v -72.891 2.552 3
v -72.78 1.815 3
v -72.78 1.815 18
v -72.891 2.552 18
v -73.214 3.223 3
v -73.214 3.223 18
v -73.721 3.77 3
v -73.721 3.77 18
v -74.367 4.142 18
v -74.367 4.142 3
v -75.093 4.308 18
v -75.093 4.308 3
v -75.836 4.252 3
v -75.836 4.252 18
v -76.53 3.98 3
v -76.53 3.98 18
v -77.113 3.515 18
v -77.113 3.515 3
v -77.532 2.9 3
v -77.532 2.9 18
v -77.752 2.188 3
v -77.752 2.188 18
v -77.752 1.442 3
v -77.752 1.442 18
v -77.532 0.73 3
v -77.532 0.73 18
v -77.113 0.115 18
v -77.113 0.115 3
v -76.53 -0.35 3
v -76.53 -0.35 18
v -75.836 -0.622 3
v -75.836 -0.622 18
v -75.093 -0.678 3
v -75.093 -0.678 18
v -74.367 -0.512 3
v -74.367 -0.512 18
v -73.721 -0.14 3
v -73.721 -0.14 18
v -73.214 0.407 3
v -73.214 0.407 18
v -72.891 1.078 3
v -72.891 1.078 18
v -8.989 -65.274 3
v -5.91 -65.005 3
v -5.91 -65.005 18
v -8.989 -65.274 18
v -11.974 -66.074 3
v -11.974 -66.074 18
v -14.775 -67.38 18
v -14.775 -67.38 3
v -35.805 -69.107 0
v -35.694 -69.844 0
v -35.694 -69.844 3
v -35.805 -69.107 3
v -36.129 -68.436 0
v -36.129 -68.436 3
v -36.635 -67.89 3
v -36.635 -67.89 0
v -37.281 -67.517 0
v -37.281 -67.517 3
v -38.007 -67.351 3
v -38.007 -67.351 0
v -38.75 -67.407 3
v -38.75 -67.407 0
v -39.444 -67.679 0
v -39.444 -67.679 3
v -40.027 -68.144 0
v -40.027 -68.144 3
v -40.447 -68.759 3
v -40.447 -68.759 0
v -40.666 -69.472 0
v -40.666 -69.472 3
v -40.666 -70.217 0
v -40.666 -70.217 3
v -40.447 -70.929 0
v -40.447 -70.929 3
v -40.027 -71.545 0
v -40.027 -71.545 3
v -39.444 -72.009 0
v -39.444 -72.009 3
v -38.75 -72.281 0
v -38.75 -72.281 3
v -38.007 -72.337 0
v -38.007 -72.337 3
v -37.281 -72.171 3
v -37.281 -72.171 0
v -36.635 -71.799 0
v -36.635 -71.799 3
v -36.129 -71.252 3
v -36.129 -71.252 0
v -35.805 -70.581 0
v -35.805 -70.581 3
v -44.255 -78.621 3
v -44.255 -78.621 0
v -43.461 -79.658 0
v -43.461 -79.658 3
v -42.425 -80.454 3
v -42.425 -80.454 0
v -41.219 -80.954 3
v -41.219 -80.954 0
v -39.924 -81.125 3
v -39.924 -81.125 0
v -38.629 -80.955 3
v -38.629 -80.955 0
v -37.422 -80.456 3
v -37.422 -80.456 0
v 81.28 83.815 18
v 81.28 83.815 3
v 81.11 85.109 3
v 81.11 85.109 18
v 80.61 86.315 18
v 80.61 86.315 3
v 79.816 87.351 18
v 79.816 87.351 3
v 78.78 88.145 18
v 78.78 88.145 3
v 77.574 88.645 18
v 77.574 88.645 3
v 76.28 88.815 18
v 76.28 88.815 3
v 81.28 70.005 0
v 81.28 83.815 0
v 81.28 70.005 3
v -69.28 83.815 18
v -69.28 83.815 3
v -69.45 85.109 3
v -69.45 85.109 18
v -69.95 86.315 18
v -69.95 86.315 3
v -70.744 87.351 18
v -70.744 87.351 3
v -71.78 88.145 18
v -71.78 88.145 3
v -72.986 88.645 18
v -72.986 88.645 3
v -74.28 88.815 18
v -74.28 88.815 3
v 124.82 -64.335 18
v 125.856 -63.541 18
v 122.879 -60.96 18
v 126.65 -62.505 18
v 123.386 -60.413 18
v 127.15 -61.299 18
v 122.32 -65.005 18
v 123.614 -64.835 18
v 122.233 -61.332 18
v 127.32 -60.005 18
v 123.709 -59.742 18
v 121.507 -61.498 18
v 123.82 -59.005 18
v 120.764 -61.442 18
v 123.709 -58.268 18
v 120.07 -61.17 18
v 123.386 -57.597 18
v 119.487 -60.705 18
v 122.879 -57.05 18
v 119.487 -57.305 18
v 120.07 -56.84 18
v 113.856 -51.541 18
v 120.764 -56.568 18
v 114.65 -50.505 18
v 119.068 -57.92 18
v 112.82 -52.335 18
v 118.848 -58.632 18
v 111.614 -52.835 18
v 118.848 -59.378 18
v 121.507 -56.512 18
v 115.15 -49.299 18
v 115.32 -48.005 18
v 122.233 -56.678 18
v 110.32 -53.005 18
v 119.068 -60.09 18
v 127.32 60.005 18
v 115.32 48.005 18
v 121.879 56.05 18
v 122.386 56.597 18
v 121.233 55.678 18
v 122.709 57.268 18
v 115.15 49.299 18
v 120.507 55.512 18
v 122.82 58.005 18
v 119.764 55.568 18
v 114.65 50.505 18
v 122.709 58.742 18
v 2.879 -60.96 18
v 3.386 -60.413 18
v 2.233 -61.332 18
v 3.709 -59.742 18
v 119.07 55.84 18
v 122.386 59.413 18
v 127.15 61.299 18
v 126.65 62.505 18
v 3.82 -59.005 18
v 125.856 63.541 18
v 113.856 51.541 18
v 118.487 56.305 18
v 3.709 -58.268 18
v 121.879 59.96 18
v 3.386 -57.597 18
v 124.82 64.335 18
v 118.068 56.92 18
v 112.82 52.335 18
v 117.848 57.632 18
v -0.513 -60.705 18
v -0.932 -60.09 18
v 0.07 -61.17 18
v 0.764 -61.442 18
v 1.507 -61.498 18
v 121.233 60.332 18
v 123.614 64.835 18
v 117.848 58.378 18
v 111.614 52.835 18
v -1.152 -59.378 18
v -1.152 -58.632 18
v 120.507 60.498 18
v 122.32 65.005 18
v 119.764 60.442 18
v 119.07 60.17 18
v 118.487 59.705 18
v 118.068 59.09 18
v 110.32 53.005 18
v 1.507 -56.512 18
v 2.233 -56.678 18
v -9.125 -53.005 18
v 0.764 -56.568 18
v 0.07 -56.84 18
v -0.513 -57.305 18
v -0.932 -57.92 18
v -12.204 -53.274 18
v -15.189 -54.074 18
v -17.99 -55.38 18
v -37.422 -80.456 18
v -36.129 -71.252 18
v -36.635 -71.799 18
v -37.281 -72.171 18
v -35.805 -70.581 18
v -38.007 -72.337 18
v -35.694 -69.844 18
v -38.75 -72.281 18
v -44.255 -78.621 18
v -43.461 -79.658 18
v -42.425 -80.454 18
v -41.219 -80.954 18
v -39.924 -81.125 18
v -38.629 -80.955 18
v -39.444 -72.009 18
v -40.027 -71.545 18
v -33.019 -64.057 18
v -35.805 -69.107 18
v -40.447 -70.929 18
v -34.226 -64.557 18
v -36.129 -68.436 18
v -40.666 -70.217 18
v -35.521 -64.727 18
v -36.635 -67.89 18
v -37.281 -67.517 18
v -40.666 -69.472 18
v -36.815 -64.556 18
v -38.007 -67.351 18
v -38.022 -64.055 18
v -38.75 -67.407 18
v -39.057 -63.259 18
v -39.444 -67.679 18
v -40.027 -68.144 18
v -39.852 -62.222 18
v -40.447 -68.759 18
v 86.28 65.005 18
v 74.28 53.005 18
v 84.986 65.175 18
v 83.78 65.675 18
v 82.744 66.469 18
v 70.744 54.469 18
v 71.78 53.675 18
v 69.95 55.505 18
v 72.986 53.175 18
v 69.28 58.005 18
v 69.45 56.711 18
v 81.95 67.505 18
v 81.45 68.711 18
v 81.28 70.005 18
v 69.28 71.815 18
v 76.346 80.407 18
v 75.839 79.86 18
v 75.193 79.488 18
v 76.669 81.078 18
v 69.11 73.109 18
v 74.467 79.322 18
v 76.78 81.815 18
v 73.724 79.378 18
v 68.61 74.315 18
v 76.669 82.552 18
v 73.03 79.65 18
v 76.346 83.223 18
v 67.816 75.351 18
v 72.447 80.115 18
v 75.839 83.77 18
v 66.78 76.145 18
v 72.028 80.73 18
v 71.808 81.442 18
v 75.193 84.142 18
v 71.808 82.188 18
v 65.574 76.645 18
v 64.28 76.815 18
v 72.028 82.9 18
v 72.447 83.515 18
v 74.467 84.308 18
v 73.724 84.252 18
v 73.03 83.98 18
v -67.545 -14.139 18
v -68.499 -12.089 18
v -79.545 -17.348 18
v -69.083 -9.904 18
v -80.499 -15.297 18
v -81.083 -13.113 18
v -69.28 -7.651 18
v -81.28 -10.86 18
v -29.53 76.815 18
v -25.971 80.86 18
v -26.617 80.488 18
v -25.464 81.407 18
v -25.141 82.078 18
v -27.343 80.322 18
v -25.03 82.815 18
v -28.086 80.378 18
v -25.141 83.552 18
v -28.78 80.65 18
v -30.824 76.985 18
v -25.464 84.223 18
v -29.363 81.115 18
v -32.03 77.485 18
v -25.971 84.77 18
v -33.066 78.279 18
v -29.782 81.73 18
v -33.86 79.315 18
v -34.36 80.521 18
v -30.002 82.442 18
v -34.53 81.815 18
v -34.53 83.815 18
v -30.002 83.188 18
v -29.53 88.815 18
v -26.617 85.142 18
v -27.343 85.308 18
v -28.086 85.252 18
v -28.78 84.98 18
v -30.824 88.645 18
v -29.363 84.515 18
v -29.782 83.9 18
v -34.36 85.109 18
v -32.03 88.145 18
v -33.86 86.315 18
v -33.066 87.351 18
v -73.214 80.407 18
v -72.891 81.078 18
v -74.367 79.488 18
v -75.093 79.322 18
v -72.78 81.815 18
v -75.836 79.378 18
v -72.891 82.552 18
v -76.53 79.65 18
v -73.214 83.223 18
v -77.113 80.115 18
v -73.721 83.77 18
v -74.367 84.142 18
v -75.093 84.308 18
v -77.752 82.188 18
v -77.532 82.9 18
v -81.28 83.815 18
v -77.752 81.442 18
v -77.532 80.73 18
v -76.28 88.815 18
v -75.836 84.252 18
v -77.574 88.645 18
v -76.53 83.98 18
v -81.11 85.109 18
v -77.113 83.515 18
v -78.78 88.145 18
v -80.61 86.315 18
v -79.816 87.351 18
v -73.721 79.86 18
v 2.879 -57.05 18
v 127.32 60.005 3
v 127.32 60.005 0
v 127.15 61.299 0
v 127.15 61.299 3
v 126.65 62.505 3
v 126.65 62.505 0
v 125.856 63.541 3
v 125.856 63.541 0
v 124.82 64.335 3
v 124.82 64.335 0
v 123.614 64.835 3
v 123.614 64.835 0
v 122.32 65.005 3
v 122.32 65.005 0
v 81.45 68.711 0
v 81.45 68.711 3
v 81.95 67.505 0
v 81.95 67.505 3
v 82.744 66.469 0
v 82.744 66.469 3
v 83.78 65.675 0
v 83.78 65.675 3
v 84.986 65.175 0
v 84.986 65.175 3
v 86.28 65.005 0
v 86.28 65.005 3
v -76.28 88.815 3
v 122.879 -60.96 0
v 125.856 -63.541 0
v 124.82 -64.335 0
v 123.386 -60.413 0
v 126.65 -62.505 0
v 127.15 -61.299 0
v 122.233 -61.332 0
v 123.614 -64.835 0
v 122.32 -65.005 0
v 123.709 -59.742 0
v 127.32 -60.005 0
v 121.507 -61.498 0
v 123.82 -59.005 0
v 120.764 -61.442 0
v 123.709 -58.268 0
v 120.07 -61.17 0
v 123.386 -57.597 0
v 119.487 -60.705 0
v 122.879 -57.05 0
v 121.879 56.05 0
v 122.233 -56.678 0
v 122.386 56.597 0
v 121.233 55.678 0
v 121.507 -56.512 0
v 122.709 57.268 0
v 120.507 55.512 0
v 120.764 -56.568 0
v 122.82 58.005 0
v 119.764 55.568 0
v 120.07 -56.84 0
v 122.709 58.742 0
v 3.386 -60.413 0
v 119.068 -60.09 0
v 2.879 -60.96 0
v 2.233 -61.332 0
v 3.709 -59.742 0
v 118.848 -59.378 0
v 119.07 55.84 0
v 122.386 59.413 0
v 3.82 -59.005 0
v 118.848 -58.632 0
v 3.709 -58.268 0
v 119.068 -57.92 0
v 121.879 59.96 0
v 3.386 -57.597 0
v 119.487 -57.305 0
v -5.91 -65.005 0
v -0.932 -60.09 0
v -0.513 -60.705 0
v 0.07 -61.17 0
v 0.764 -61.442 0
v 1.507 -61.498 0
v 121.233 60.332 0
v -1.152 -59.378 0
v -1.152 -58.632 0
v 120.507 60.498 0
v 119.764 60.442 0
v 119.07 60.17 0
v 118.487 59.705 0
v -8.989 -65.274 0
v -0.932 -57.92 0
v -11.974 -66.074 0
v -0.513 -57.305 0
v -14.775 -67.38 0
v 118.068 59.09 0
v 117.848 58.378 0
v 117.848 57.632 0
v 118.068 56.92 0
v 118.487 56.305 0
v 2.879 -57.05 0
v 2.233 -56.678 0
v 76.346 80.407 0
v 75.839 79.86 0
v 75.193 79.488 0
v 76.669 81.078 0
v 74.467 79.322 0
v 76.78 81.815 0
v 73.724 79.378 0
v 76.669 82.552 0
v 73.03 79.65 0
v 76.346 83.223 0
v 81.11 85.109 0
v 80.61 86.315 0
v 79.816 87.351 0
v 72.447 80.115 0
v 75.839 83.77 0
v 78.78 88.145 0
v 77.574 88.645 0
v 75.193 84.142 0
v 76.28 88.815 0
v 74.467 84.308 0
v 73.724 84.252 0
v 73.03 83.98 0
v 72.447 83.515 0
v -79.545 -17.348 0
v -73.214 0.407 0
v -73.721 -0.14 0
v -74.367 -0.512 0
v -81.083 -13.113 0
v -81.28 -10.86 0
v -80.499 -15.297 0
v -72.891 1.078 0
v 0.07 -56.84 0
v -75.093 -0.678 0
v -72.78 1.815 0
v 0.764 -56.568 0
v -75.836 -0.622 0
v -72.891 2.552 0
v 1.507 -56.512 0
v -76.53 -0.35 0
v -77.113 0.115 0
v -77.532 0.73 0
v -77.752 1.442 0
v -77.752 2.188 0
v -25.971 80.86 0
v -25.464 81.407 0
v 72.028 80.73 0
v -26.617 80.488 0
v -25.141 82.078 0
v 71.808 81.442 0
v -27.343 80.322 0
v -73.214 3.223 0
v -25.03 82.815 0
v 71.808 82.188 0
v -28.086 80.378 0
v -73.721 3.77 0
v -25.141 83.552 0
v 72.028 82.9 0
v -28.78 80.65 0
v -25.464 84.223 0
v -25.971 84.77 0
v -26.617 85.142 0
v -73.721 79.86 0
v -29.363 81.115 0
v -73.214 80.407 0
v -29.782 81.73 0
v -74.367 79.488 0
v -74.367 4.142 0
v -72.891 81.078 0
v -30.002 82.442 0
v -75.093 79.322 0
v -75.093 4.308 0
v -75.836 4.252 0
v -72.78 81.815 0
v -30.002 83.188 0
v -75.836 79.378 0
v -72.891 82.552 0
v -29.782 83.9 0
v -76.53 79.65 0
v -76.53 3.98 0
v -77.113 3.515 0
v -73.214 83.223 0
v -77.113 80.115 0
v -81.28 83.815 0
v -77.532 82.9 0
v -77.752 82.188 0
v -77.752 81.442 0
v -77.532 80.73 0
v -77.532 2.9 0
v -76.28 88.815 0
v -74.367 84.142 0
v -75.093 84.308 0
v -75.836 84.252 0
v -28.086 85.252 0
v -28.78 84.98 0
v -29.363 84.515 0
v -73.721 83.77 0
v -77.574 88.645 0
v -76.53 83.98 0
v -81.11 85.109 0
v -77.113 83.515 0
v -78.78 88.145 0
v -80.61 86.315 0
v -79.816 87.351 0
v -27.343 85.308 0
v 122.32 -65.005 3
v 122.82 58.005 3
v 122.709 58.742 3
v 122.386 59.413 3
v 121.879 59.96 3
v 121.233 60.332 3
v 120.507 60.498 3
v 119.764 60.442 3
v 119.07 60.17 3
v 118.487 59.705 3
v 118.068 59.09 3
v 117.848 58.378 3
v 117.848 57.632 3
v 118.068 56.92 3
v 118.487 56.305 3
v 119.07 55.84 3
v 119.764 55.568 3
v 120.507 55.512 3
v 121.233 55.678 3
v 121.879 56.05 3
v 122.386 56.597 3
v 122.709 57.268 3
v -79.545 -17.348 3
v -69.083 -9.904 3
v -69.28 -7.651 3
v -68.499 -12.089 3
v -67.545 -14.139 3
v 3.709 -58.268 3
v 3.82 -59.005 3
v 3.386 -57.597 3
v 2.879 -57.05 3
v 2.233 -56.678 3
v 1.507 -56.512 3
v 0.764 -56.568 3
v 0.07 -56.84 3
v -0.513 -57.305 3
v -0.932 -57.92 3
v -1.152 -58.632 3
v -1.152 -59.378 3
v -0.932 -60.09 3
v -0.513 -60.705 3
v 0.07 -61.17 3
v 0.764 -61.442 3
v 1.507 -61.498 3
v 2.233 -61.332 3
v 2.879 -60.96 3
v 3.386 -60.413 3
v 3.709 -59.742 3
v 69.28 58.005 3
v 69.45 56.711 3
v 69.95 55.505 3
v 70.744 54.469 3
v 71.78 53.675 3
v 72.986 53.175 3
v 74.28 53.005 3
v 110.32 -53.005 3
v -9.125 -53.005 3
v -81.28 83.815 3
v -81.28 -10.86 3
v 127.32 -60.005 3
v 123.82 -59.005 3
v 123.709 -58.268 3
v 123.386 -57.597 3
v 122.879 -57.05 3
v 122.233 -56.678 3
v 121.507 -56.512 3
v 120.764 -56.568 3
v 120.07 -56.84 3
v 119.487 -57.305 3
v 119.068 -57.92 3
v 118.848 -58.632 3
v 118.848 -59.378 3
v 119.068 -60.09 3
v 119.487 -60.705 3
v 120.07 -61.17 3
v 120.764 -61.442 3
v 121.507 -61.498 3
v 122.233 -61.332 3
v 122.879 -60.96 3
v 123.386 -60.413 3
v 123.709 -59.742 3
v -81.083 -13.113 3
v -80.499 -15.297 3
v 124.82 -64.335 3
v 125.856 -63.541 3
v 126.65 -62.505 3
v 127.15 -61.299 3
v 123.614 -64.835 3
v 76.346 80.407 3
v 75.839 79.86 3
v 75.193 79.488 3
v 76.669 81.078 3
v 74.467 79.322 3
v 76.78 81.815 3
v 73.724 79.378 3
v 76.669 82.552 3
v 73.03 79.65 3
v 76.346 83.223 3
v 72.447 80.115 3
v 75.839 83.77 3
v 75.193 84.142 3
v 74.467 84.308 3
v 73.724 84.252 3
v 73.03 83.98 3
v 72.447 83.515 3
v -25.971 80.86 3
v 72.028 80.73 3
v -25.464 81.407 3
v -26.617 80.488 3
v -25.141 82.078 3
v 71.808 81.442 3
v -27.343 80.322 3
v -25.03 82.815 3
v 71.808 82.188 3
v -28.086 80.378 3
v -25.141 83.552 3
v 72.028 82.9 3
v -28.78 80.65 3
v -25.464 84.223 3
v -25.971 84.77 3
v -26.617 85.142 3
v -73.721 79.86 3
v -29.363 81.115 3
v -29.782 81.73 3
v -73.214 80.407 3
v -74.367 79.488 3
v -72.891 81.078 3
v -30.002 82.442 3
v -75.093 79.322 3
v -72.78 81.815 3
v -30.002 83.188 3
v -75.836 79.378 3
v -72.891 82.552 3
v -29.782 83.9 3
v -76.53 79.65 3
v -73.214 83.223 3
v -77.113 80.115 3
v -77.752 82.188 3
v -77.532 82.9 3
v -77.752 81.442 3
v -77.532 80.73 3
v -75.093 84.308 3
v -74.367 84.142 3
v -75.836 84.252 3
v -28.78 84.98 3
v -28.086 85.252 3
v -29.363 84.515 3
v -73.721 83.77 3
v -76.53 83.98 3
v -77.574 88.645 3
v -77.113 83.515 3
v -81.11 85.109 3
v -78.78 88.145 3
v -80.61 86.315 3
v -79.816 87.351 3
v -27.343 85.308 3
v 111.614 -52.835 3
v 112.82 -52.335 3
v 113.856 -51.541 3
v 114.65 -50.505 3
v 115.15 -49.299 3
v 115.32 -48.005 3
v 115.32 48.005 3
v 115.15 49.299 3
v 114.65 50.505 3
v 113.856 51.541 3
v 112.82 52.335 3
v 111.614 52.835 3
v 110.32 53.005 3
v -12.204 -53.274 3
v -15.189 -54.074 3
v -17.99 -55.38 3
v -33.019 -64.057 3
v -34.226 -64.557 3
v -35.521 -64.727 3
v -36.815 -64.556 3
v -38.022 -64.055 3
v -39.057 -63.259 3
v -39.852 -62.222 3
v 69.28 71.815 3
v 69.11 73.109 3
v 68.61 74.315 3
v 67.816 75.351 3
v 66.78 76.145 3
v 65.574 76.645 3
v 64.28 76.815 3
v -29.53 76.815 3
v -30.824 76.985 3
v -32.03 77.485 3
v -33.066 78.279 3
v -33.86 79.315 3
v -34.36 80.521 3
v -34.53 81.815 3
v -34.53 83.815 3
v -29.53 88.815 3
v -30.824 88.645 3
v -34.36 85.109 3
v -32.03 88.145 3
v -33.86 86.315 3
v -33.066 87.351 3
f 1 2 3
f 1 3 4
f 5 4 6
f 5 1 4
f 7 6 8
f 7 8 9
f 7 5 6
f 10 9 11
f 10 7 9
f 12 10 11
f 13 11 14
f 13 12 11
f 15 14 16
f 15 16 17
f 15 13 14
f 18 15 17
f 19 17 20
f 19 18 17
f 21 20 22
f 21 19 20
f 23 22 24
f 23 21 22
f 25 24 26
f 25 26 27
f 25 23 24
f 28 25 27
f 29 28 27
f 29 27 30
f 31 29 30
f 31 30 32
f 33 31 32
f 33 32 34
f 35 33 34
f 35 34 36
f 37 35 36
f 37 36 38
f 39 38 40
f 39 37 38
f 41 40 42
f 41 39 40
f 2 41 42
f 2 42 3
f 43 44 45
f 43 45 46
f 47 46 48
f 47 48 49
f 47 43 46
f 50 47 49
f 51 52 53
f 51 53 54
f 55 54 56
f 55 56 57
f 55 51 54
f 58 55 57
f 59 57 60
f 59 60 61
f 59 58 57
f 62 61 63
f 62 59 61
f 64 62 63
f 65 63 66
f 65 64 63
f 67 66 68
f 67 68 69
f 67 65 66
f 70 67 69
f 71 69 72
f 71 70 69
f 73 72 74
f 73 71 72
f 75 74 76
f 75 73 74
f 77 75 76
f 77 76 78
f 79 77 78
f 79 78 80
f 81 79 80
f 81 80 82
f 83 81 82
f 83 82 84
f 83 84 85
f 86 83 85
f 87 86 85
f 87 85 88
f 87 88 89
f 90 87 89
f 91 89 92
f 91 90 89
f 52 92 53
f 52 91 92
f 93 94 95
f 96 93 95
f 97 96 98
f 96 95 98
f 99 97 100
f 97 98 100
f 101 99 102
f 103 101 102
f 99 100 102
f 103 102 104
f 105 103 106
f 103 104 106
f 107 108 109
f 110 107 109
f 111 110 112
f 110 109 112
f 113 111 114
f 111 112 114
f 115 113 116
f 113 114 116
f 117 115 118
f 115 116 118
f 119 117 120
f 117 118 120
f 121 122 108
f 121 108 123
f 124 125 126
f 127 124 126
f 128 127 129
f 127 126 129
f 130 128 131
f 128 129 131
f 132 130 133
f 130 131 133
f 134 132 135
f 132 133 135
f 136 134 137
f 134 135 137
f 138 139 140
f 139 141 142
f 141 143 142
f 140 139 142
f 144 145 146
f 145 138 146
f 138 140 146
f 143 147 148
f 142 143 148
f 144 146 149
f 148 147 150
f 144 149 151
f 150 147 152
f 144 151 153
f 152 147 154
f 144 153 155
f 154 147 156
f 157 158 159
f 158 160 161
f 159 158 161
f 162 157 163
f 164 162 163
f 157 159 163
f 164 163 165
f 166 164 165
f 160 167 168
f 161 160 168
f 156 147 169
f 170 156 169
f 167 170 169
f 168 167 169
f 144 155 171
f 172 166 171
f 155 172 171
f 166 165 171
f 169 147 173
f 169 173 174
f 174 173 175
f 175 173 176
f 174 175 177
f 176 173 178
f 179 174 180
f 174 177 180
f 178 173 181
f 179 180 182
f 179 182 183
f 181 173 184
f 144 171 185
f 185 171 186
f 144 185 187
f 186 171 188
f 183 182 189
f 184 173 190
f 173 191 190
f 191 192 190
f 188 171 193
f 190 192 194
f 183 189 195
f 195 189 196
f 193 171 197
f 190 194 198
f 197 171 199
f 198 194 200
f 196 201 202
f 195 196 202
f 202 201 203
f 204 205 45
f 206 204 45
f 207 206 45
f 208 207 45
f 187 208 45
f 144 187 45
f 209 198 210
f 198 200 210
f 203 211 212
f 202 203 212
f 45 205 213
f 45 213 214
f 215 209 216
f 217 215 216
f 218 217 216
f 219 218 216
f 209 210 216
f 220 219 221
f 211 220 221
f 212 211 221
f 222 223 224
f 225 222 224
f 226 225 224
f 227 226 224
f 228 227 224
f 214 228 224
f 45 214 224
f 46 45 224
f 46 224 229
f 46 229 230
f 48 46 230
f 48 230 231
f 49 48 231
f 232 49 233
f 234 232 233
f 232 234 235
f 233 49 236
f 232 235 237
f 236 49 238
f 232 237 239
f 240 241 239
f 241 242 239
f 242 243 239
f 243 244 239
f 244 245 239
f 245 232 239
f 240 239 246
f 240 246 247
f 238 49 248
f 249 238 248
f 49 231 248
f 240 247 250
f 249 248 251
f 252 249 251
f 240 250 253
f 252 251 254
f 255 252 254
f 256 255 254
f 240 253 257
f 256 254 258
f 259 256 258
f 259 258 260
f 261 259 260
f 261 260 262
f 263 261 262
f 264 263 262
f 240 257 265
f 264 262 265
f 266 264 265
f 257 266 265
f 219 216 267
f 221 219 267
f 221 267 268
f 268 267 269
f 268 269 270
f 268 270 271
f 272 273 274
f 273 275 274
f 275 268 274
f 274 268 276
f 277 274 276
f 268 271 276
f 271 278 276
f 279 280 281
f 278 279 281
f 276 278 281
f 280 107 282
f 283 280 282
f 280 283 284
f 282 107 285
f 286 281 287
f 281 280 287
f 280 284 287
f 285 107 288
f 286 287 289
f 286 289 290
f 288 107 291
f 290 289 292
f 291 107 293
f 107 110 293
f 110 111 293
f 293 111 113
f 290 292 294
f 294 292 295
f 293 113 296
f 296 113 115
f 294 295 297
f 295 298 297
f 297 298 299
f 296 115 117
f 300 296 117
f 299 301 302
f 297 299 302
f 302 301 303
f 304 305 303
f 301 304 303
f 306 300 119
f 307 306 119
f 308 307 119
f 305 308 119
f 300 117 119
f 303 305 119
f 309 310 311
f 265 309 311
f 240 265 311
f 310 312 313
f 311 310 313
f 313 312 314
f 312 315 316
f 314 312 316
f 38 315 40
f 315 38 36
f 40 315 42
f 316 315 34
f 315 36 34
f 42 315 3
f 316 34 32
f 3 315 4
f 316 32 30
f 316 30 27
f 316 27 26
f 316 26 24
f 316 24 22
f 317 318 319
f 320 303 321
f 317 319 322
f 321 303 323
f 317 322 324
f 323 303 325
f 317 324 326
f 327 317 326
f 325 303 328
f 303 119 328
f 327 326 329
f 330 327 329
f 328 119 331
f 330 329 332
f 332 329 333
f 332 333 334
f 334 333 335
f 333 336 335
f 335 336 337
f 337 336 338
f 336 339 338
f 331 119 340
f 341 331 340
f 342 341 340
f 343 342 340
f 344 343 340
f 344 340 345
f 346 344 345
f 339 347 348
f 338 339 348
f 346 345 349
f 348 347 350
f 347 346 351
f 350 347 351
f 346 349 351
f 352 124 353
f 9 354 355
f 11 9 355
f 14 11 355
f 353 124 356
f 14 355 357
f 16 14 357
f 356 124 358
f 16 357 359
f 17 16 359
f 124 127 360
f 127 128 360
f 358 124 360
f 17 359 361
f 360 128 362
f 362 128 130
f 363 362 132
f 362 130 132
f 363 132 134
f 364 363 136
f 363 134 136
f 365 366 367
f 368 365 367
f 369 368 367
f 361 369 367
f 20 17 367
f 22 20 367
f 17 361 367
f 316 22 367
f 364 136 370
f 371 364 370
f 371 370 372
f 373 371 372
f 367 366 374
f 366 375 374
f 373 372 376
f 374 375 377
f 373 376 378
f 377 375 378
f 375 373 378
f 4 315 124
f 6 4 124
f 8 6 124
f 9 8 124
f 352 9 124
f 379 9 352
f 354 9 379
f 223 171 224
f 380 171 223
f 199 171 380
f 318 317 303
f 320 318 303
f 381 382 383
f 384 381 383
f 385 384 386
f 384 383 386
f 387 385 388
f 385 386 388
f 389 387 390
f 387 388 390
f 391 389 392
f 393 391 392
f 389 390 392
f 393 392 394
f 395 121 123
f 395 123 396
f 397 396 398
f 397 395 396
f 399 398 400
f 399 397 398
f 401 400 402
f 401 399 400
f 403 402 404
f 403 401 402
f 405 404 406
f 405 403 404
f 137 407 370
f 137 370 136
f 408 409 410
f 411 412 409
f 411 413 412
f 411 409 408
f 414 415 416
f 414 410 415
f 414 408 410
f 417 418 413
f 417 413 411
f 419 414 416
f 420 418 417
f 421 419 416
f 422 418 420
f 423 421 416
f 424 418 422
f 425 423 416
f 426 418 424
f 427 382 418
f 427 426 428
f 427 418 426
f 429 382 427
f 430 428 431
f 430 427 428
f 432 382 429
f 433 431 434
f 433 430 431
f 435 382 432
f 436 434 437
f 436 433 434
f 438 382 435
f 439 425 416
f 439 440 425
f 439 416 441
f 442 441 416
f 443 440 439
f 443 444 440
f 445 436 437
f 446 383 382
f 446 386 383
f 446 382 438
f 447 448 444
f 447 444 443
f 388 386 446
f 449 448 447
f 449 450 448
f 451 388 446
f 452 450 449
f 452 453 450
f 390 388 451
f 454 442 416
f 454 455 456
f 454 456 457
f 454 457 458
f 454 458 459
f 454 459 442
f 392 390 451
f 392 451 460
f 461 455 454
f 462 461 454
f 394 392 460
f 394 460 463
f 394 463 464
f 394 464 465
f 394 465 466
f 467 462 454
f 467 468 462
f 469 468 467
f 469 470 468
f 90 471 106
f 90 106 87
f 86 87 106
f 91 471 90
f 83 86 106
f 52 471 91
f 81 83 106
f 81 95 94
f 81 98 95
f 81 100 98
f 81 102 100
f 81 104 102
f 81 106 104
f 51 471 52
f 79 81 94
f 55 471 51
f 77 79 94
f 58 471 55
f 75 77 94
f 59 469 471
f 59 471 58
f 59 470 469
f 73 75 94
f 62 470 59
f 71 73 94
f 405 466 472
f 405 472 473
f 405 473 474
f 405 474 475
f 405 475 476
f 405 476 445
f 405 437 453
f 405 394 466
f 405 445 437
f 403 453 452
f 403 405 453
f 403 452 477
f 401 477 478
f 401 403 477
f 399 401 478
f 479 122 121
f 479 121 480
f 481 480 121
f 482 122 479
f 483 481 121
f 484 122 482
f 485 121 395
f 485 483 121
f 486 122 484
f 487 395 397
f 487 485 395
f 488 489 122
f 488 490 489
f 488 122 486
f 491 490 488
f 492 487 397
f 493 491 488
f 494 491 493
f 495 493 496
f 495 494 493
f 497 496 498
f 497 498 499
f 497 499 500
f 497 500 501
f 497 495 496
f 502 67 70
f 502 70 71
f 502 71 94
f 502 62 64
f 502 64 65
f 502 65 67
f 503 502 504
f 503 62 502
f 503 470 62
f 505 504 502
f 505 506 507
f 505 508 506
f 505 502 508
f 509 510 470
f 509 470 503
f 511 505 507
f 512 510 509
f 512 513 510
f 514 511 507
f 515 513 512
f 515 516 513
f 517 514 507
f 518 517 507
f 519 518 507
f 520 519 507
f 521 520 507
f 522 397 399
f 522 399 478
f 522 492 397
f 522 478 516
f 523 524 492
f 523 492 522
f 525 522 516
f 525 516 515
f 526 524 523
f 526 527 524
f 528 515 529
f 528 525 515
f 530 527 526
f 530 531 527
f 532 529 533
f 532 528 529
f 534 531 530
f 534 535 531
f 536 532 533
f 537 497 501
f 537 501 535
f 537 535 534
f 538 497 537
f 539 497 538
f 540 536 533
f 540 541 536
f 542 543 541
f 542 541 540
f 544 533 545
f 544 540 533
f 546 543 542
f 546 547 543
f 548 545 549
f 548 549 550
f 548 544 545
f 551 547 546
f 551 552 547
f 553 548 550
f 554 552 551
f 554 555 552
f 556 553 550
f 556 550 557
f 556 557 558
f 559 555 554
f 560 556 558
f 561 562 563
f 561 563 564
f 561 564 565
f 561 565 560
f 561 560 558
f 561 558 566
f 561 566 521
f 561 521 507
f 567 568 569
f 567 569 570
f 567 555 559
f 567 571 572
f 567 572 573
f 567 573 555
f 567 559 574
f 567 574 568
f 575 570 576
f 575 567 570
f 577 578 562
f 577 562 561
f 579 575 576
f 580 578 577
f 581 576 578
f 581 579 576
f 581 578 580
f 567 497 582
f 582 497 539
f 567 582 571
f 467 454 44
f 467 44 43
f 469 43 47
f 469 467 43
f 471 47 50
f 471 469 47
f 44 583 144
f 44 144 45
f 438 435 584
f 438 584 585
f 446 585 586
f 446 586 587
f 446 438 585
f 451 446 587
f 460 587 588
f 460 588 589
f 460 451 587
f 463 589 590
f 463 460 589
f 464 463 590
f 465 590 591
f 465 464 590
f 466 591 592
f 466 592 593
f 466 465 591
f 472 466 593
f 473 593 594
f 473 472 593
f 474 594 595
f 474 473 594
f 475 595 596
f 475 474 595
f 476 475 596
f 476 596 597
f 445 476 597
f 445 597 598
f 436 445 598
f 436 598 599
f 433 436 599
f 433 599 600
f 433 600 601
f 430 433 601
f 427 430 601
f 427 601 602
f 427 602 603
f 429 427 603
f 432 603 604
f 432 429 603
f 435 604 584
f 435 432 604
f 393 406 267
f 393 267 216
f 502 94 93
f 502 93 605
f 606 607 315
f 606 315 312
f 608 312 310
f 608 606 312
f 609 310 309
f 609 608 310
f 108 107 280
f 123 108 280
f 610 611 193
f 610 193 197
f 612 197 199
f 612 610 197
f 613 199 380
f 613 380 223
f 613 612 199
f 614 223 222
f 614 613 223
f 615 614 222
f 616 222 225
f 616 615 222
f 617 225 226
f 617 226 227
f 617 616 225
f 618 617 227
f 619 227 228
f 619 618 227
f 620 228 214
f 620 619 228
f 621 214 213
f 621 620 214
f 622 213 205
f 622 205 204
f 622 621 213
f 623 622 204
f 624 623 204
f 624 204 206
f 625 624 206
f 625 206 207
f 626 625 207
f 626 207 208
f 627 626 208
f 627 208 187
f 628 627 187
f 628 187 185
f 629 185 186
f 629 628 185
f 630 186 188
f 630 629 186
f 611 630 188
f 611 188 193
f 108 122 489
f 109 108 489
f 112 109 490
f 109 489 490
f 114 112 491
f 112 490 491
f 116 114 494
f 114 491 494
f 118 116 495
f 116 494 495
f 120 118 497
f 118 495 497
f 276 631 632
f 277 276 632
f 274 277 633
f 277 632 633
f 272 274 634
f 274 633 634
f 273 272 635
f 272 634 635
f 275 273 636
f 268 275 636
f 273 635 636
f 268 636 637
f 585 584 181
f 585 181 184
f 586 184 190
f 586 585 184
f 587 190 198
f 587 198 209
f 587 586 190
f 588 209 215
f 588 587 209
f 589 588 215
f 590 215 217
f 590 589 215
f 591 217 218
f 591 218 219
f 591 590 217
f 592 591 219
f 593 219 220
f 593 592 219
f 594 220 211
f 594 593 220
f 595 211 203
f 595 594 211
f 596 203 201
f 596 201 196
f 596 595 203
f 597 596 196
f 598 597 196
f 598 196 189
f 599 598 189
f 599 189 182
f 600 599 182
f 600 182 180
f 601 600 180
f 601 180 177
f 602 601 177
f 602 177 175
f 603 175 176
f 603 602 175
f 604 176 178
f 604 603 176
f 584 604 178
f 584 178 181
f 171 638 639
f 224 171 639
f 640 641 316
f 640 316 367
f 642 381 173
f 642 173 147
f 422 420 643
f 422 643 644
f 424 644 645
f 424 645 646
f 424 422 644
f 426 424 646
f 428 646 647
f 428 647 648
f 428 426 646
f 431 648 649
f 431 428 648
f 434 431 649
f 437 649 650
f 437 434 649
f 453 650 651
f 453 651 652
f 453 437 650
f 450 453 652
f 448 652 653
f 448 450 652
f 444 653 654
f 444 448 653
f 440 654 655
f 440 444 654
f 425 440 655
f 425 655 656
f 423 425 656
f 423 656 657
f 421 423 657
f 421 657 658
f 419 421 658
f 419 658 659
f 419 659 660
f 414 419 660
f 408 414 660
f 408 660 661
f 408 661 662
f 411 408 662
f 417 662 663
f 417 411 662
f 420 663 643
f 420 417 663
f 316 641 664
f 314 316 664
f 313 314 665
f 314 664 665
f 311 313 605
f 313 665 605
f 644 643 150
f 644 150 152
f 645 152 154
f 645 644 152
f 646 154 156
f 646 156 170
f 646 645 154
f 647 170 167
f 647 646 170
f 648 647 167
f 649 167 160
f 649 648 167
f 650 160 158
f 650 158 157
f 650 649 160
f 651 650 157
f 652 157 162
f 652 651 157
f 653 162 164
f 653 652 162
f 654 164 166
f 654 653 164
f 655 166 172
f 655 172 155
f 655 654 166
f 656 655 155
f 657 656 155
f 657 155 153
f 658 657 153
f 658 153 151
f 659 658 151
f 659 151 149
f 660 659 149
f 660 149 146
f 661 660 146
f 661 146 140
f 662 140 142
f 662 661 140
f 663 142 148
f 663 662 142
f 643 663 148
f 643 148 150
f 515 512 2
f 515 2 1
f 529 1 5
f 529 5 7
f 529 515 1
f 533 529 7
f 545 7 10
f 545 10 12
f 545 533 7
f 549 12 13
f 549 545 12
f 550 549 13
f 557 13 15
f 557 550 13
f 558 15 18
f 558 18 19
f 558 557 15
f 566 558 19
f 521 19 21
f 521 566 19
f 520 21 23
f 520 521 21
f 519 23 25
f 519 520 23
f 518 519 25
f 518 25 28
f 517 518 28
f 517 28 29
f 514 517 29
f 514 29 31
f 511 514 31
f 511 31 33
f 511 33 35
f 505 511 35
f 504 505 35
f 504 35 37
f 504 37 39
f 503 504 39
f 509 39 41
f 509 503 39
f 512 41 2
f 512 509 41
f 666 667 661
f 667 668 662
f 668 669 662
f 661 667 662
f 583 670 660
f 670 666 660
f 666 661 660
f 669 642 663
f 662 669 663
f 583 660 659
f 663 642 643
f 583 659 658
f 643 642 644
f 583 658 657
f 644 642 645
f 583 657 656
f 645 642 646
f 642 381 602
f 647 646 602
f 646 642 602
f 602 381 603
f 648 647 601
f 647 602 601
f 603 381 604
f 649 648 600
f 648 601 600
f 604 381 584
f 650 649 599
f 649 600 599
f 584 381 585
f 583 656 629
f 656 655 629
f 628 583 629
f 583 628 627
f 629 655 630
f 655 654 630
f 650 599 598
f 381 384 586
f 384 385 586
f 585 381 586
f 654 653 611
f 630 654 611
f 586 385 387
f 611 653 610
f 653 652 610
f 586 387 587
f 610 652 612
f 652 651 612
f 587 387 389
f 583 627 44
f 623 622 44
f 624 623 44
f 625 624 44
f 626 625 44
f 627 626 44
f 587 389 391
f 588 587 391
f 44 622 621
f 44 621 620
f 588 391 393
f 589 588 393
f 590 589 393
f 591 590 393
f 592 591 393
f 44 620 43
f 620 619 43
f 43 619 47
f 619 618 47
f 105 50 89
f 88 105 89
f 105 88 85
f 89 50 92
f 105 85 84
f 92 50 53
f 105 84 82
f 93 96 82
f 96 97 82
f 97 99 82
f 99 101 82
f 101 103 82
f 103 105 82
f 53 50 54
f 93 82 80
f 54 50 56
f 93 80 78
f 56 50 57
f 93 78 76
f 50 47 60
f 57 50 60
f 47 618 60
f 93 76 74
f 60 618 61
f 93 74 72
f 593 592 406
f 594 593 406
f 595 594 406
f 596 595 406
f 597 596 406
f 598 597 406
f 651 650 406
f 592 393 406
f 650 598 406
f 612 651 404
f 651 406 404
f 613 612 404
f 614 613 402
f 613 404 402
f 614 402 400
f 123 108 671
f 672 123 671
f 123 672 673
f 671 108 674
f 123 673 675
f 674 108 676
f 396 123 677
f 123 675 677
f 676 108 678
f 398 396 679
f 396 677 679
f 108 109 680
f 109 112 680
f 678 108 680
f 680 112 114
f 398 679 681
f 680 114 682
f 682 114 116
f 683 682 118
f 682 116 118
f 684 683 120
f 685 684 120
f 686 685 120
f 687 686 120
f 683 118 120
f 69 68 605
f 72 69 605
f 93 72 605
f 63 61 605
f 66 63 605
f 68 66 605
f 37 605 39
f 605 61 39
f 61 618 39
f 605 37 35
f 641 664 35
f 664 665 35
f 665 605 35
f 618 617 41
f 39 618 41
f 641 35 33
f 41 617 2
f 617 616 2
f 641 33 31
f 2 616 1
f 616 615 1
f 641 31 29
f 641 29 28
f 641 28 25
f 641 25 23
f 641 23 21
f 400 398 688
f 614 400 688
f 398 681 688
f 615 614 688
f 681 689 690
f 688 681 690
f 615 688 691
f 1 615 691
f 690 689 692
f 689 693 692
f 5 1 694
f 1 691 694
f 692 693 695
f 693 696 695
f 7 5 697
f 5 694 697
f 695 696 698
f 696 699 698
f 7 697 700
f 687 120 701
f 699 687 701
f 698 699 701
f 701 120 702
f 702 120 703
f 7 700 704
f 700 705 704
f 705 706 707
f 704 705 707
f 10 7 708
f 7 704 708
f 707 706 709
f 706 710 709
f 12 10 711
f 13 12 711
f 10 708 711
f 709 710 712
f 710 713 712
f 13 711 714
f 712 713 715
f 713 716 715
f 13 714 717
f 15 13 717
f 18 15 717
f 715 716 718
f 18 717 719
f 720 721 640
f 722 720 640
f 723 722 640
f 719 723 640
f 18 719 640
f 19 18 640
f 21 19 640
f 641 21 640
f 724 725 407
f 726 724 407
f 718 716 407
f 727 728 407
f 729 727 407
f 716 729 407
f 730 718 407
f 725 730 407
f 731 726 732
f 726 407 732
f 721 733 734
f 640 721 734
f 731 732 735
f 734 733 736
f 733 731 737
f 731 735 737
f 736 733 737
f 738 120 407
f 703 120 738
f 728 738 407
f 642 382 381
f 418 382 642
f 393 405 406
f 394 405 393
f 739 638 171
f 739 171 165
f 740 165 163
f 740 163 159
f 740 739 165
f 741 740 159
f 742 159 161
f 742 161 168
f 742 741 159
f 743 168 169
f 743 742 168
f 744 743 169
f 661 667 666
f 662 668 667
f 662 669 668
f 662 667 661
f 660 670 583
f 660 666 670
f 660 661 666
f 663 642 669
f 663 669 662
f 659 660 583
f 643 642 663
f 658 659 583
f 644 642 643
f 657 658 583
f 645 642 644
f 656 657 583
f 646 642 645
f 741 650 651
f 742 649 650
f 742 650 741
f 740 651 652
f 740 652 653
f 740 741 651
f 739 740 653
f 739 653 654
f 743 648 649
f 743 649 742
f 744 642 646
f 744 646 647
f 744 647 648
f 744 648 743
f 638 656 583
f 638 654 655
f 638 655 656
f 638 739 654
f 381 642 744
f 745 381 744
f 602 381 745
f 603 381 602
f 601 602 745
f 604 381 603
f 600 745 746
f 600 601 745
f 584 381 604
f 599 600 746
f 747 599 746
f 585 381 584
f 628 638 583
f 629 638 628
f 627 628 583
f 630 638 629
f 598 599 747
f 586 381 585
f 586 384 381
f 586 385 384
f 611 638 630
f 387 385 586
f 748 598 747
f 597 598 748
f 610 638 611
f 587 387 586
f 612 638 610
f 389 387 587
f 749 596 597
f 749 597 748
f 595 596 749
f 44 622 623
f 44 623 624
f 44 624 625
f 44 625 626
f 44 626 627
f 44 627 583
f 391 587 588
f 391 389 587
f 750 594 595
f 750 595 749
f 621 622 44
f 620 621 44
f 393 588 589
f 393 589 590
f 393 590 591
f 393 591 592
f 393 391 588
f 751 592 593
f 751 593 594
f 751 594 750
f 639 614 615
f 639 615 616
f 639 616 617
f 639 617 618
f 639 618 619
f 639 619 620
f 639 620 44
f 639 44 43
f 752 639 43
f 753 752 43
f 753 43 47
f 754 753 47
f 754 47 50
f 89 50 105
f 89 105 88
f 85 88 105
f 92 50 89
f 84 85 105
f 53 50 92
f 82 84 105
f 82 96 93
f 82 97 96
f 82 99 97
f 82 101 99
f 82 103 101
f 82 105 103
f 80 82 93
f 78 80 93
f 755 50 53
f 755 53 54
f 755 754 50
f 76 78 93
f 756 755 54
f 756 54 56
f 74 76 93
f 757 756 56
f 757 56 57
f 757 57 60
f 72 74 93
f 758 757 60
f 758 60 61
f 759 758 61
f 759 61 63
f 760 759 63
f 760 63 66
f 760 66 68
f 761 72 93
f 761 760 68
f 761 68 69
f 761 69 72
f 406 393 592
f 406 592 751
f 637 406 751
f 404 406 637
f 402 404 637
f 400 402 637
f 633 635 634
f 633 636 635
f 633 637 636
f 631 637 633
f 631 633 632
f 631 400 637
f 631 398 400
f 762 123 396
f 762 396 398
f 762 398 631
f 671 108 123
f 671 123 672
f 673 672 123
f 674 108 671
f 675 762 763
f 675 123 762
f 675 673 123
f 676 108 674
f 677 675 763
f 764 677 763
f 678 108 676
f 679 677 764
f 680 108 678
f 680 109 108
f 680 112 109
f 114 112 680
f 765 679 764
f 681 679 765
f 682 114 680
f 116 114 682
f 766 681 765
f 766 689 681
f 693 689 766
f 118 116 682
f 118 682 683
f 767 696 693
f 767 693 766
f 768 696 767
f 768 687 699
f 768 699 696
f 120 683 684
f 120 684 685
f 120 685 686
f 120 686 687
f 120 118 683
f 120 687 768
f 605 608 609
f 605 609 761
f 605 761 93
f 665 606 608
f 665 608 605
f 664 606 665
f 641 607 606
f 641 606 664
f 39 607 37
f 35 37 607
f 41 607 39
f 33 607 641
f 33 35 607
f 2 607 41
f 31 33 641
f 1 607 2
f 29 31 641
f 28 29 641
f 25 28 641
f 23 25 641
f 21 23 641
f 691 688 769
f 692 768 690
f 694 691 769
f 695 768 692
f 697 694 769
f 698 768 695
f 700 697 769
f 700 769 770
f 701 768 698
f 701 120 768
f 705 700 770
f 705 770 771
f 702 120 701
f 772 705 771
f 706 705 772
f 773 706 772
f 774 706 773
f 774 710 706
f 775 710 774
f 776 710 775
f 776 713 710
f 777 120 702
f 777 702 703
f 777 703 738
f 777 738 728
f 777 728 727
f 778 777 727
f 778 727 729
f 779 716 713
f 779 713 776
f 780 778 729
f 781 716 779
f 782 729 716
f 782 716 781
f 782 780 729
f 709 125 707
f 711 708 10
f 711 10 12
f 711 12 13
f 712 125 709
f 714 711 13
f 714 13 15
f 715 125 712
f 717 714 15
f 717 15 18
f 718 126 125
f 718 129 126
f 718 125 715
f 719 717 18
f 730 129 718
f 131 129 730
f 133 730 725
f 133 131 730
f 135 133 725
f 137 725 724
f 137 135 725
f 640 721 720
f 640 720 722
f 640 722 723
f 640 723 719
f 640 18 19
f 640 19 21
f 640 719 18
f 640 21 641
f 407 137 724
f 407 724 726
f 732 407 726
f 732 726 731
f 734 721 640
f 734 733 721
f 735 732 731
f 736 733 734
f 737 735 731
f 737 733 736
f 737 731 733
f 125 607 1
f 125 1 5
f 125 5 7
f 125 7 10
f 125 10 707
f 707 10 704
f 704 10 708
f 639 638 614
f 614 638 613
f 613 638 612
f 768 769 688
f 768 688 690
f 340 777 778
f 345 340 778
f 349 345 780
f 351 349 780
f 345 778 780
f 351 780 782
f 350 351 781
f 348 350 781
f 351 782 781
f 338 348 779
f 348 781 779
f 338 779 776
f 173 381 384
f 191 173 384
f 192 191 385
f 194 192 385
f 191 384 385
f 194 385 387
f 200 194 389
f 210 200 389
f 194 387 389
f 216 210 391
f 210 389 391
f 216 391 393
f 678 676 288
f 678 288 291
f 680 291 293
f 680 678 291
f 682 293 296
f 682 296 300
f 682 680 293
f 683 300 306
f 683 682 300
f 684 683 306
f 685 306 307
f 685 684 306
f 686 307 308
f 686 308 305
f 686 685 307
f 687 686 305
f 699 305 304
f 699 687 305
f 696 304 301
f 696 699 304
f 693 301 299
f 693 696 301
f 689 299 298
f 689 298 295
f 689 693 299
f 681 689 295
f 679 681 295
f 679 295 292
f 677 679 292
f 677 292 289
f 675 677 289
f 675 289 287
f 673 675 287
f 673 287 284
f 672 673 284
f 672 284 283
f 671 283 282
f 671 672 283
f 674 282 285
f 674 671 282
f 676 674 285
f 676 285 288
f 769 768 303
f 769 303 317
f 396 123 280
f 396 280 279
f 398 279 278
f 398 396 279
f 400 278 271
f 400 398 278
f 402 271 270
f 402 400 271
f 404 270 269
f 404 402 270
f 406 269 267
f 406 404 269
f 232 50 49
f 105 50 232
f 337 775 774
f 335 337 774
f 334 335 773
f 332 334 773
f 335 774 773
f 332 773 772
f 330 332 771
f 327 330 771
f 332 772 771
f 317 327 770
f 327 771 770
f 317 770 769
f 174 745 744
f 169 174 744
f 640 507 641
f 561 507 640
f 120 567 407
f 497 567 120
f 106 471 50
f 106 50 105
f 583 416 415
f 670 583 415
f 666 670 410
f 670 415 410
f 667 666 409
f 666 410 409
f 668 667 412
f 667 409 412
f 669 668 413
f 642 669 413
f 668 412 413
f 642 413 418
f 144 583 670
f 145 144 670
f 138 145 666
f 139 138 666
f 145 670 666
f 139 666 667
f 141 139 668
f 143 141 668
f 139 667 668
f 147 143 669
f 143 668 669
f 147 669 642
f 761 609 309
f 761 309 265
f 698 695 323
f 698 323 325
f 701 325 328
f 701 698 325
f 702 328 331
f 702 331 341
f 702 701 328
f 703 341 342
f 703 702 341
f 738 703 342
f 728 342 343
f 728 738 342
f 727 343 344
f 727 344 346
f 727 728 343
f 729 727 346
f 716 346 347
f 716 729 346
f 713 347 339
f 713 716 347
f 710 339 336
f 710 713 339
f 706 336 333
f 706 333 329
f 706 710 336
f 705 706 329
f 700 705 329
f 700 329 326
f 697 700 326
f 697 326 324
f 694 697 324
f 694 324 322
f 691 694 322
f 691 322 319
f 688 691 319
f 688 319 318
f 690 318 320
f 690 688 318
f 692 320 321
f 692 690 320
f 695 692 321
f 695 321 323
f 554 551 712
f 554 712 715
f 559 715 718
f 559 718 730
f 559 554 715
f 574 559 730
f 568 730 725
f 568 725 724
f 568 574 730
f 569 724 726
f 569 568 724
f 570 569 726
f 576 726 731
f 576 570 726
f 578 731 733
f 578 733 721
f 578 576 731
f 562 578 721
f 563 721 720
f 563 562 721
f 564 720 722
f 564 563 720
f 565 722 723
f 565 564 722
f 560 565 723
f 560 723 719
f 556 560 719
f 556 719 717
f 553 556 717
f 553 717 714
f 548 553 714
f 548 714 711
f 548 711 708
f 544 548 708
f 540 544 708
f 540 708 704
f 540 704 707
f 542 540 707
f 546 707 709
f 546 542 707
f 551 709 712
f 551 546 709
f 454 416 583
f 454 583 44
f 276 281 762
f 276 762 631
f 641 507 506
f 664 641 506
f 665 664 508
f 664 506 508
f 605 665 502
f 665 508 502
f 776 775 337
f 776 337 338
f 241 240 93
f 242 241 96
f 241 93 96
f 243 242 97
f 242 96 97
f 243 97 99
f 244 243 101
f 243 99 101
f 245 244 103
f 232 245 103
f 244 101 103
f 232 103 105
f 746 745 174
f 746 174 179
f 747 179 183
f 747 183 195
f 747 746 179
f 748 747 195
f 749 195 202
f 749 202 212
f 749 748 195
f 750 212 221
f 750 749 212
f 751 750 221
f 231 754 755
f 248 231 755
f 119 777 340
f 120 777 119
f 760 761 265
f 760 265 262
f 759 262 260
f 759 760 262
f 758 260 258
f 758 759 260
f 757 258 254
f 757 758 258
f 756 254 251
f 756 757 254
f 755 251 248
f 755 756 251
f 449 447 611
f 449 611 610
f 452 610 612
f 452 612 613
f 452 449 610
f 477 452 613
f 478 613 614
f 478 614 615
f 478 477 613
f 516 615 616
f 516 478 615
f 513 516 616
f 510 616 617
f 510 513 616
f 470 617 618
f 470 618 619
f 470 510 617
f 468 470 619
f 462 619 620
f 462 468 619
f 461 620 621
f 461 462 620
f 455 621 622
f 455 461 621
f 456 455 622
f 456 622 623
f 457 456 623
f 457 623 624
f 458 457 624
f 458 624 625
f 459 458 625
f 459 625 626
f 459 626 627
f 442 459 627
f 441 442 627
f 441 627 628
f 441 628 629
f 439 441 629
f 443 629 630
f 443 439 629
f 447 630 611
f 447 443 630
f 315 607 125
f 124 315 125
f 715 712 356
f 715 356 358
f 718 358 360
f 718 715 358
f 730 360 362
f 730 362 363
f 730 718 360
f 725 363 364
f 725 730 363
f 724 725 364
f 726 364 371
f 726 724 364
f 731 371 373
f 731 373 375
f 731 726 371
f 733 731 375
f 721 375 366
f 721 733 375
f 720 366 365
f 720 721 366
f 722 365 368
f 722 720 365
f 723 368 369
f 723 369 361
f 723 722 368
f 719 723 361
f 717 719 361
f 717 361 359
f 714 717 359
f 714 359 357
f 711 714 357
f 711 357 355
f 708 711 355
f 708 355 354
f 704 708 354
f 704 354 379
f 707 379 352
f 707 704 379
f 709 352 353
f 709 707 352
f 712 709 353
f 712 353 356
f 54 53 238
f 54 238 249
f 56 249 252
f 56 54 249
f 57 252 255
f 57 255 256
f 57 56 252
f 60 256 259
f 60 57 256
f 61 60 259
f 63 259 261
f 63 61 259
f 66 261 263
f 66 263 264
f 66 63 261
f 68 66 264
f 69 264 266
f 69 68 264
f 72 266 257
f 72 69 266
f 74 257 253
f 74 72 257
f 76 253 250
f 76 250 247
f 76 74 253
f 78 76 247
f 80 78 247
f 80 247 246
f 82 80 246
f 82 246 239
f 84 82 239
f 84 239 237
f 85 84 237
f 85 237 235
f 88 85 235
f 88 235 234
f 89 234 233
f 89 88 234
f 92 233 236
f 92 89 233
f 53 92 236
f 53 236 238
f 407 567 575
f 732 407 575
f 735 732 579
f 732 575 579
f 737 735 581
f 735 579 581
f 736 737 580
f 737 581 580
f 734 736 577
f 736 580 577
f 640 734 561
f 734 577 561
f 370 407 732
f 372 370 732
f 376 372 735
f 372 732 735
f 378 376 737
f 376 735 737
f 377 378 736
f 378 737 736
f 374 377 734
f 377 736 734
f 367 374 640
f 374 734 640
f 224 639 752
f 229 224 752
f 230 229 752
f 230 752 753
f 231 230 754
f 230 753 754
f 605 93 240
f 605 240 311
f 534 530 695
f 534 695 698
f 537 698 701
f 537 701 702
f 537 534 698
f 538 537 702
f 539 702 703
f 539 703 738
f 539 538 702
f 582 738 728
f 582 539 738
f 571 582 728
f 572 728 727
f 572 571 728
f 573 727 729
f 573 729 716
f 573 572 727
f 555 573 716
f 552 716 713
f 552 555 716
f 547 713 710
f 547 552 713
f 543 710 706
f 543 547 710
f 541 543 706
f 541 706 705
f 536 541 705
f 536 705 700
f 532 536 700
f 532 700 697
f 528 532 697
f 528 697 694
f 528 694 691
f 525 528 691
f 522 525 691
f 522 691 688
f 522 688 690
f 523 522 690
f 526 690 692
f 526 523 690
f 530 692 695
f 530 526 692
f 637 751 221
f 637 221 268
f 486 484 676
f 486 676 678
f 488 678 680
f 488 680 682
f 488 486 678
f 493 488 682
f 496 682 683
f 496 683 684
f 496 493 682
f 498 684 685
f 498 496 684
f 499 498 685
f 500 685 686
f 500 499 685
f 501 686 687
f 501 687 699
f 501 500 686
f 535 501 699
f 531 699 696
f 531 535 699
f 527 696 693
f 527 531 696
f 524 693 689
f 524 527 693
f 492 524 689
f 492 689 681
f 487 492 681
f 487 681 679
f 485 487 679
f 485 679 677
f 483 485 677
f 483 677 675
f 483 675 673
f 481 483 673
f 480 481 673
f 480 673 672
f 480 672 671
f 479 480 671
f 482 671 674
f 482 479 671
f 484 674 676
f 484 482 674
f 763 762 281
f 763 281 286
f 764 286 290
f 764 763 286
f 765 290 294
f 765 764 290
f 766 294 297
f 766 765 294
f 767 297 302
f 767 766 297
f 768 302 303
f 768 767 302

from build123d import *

# Parameters (mm, degrees)
MIRROREDSKETCH_R    = 2.5
EXTRUDE_DEPTH       = 3
MIRROREDSKETCH001_R = 2.5
EXTRUDE001_DEPTH    = 15


with BuildPart() as extrude_body:
    # MirroredSketch → Extrude (new body)
    with BuildSketch(Plane.XY):
        with BuildLine():
            Line((127.32, 60.005), (127.32, -60.005))
            ThreePointArc((122.32, -65.005), (125.855534, -63.540534), (127.32, -60.005))
            Line((122.32, -65.005), (-5.910023, -65.005))
            ThreePointArc((-5.910023, -65.005), (-10.498885, -65.609135), (-14.775023, -67.38037))
            Line((-14.775023, -67.38037), (-37.422033, -80.455627))
            ThreePointArc((-44.254779, -78.620958), (-41.21866, -80.95445), (-37.422033, -80.455627))
            Line((-44.254779, -78.620958), (-79.54514, -17.347965))
            ThreePointArc((-81.28, -10.859775), (-80.838798, -14.217838), (-79.54514, -17.347965))
            Line((-81.28, -10.859775), (-81.28, 83.815))
            ThreePointArc((-76.28, 88.815), (-79.815534, 87.350534), (-81.28, 83.815))
            Line((-76.28, 88.815), (76.28, 88.815))
            ThreePointArc((81.28, 83.815), (79.815534, 87.350534), (76.28, 88.815))
            Line((81.28, 83.815), (81.28, 70.005))
            ThreePointArc((81.28, 70.005), (82.744466, 66.469466), (86.28, 65.005))
            Line((86.28, 65.005), (122.32, 65.005))
            ThreePointArc((127.32, 60.005), (125.855534, 63.540534), (122.32, 65.005))
        make_face()
        with Locations((120.32, 58.005)):
            Circle(MIRROREDSKETCH_R, mode=Mode.SUBTRACT)
        with Locations((121.32, -59.005)):
            Circle(MIRROREDSKETCH_R, mode=Mode.SUBTRACT)
        with Locations((1.32, -59.005)):
            Circle(MIRROREDSKETCH_R, mode=Mode.SUBTRACT)
        with Locations((-38.194107, -69.844124)):
            Circle(MIRROREDSKETCH_R, mode=Mode.SUBTRACT)
        with Locations((-75.28, 1.815)):
            Circle(MIRROREDSKETCH_R, mode=Mode.SUBTRACT)
        with Locations((-75.28, 81.815)):
            Circle(MIRROREDSKETCH_R, mode=Mode.SUBTRACT)
        with Locations((-27.53, 82.815)):
            Circle(MIRROREDSKETCH_R, mode=Mode.SUBTRACT)
        with Locations((74.28, 81.815)):
            Circle(MIRROREDSKETCH_R, mode=Mode.SUBTRACT)
    extrude(amount=EXTRUDE_DEPTH)


with BuildPart() as extrude001:
    # MirroredSketch001 → Extrude001 (new body)
    with BuildSketch(Plane.XY.offset(3)):
        with BuildLine():
            Line((-69.28, 71.815), (-69.28, -7.651127))
            ThreePointArc((-69.28, -7.651127), (-68.838798, -11.00919), (-67.54514, -14.139318))
            Line((-67.54514, -14.139318), (-39.851571, -62.222358))
            ThreePointArc((-39.851571, -62.222358), (-36.815452, -64.55585), (-33.018825, -64.057027))
            Line((-17.990413, -55.38037), (-33.018825, -64.057027))
            ThreePointArc((-9.125413, -53.005), (-13.714275, -53.609135), (-17.990413, -55.38037))
            Line((110.32, -53.005), (-9.125413, -53.005))
            ThreePointArc((110.32, -53.005), (113.855534, -51.540534), (115.32, -48.005))
            Line((115.32, 48.005), (115.32, -48.005))
            ThreePointArc((115.32, 48.005), (113.855534, 51.540534), (110.32, 53.005))
            Line((110.32, 53.005), (74.28, 53.005))
            ThreePointArc((69.28, 58.005), (70.744466, 54.469466), (74.28, 53.005))
            Line((69.28, 71.815), (69.28, 58.005))
            ThreePointArc((69.28, 71.815), (67.815534, 75.350534), (64.28, 76.815))
            Line((64.28, 76.815), (-29.53, 76.815))
            ThreePointArc((-34.53, 81.815), (-33.065534, 78.279466), (-29.53, 76.815))
            Line((-34.53, 81.815), (-34.53, 83.815))
            ThreePointArc((-29.53, 88.815), (-33.065534, 87.350534), (-34.53, 83.815))
            Line((-29.53, 88.815), (76.28, 88.815))
            ThreePointArc((81.28, 83.815), (79.815534, 87.350534), (76.28, 88.815))
            Line((81.28, 83.815), (81.28, 70.005))
            ThreePointArc((81.28, 70.005), (82.744466, 66.469466), (86.28, 65.005))
            Line((86.28, 65.005), (122.32, 65.005))
            ThreePointArc((127.32, 60.005), (125.855534, 63.540534), (122.32, 65.005))
            Line((127.32, 60.005), (127.32, -60.005))
            ThreePointArc((122.32, -65.005), (125.855534, -63.540534), (127.32, -60.005))
            Line((122.32, -65.005), (-5.910023, -65.005))
            ThreePointArc((-5.910023, -65.005), (-10.498885, -65.609135), (-14.775023, -67.38037))
            Line((-14.775023, -67.38037), (-37.422033, -80.455627))
            ThreePointArc((-44.254779, -78.620958), (-41.21866, -80.95445), (-37.422033, -80.455627))
            Line((-44.254779, -78.620958), (-79.54514, -17.347965))
            ThreePointArc((-81.28, -10.859775), (-80.838798, -14.217838), (-79.54514, -17.347965))
            Line((-81.28, -10.859775), (-81.28, 83.815))
            ThreePointArc((-76.28, 88.815), (-79.815534, 87.350534), (-81.28, 83.815))
            Line((-76.28, 88.815), (-74.28, 88.815))
            ThreePointArc((-69.28, 83.815), (-70.744466, 87.350534), (-74.28, 88.815))
            Line((-69.28, 71.815), (-69.28, 83.815))
        make_face()
        with Locations((120.32, 58.005)):
            Circle(MIRROREDSKETCH001_R, mode=Mode.SUBTRACT)
        with Locations((121.32, -59.005)):
            Circle(MIRROREDSKETCH001_R, mode=Mode.SUBTRACT)
        with Locations((1.32, -59.005)):
            Circle(MIRROREDSKETCH001_R, mode=Mode.SUBTRACT)
        with Locations((-38.194107, -69.844124)):
            Circle(MIRROREDSKETCH001_R, mode=Mode.SUBTRACT)
        with Locations((-75.28, 1.815)):
            Circle(MIRROREDSKETCH001_R, mode=Mode.SUBTRACT)
        with Locations((-75.28, 81.815)):
            Circle(MIRROREDSKETCH001_R, mode=Mode.SUBTRACT)
        with Locations((-27.53, 82.815)):
            Circle(MIRROREDSKETCH001_R, mode=Mode.SUBTRACT)
        with Locations((74.28, 81.815)):
            Circle(MIRROREDSKETCH001_R, mode=Mode.SUBTRACT)
    extrude(amount=EXTRUDE001_DEPTH)


solid = Compound([extrude_body.part, extrude001.part])
